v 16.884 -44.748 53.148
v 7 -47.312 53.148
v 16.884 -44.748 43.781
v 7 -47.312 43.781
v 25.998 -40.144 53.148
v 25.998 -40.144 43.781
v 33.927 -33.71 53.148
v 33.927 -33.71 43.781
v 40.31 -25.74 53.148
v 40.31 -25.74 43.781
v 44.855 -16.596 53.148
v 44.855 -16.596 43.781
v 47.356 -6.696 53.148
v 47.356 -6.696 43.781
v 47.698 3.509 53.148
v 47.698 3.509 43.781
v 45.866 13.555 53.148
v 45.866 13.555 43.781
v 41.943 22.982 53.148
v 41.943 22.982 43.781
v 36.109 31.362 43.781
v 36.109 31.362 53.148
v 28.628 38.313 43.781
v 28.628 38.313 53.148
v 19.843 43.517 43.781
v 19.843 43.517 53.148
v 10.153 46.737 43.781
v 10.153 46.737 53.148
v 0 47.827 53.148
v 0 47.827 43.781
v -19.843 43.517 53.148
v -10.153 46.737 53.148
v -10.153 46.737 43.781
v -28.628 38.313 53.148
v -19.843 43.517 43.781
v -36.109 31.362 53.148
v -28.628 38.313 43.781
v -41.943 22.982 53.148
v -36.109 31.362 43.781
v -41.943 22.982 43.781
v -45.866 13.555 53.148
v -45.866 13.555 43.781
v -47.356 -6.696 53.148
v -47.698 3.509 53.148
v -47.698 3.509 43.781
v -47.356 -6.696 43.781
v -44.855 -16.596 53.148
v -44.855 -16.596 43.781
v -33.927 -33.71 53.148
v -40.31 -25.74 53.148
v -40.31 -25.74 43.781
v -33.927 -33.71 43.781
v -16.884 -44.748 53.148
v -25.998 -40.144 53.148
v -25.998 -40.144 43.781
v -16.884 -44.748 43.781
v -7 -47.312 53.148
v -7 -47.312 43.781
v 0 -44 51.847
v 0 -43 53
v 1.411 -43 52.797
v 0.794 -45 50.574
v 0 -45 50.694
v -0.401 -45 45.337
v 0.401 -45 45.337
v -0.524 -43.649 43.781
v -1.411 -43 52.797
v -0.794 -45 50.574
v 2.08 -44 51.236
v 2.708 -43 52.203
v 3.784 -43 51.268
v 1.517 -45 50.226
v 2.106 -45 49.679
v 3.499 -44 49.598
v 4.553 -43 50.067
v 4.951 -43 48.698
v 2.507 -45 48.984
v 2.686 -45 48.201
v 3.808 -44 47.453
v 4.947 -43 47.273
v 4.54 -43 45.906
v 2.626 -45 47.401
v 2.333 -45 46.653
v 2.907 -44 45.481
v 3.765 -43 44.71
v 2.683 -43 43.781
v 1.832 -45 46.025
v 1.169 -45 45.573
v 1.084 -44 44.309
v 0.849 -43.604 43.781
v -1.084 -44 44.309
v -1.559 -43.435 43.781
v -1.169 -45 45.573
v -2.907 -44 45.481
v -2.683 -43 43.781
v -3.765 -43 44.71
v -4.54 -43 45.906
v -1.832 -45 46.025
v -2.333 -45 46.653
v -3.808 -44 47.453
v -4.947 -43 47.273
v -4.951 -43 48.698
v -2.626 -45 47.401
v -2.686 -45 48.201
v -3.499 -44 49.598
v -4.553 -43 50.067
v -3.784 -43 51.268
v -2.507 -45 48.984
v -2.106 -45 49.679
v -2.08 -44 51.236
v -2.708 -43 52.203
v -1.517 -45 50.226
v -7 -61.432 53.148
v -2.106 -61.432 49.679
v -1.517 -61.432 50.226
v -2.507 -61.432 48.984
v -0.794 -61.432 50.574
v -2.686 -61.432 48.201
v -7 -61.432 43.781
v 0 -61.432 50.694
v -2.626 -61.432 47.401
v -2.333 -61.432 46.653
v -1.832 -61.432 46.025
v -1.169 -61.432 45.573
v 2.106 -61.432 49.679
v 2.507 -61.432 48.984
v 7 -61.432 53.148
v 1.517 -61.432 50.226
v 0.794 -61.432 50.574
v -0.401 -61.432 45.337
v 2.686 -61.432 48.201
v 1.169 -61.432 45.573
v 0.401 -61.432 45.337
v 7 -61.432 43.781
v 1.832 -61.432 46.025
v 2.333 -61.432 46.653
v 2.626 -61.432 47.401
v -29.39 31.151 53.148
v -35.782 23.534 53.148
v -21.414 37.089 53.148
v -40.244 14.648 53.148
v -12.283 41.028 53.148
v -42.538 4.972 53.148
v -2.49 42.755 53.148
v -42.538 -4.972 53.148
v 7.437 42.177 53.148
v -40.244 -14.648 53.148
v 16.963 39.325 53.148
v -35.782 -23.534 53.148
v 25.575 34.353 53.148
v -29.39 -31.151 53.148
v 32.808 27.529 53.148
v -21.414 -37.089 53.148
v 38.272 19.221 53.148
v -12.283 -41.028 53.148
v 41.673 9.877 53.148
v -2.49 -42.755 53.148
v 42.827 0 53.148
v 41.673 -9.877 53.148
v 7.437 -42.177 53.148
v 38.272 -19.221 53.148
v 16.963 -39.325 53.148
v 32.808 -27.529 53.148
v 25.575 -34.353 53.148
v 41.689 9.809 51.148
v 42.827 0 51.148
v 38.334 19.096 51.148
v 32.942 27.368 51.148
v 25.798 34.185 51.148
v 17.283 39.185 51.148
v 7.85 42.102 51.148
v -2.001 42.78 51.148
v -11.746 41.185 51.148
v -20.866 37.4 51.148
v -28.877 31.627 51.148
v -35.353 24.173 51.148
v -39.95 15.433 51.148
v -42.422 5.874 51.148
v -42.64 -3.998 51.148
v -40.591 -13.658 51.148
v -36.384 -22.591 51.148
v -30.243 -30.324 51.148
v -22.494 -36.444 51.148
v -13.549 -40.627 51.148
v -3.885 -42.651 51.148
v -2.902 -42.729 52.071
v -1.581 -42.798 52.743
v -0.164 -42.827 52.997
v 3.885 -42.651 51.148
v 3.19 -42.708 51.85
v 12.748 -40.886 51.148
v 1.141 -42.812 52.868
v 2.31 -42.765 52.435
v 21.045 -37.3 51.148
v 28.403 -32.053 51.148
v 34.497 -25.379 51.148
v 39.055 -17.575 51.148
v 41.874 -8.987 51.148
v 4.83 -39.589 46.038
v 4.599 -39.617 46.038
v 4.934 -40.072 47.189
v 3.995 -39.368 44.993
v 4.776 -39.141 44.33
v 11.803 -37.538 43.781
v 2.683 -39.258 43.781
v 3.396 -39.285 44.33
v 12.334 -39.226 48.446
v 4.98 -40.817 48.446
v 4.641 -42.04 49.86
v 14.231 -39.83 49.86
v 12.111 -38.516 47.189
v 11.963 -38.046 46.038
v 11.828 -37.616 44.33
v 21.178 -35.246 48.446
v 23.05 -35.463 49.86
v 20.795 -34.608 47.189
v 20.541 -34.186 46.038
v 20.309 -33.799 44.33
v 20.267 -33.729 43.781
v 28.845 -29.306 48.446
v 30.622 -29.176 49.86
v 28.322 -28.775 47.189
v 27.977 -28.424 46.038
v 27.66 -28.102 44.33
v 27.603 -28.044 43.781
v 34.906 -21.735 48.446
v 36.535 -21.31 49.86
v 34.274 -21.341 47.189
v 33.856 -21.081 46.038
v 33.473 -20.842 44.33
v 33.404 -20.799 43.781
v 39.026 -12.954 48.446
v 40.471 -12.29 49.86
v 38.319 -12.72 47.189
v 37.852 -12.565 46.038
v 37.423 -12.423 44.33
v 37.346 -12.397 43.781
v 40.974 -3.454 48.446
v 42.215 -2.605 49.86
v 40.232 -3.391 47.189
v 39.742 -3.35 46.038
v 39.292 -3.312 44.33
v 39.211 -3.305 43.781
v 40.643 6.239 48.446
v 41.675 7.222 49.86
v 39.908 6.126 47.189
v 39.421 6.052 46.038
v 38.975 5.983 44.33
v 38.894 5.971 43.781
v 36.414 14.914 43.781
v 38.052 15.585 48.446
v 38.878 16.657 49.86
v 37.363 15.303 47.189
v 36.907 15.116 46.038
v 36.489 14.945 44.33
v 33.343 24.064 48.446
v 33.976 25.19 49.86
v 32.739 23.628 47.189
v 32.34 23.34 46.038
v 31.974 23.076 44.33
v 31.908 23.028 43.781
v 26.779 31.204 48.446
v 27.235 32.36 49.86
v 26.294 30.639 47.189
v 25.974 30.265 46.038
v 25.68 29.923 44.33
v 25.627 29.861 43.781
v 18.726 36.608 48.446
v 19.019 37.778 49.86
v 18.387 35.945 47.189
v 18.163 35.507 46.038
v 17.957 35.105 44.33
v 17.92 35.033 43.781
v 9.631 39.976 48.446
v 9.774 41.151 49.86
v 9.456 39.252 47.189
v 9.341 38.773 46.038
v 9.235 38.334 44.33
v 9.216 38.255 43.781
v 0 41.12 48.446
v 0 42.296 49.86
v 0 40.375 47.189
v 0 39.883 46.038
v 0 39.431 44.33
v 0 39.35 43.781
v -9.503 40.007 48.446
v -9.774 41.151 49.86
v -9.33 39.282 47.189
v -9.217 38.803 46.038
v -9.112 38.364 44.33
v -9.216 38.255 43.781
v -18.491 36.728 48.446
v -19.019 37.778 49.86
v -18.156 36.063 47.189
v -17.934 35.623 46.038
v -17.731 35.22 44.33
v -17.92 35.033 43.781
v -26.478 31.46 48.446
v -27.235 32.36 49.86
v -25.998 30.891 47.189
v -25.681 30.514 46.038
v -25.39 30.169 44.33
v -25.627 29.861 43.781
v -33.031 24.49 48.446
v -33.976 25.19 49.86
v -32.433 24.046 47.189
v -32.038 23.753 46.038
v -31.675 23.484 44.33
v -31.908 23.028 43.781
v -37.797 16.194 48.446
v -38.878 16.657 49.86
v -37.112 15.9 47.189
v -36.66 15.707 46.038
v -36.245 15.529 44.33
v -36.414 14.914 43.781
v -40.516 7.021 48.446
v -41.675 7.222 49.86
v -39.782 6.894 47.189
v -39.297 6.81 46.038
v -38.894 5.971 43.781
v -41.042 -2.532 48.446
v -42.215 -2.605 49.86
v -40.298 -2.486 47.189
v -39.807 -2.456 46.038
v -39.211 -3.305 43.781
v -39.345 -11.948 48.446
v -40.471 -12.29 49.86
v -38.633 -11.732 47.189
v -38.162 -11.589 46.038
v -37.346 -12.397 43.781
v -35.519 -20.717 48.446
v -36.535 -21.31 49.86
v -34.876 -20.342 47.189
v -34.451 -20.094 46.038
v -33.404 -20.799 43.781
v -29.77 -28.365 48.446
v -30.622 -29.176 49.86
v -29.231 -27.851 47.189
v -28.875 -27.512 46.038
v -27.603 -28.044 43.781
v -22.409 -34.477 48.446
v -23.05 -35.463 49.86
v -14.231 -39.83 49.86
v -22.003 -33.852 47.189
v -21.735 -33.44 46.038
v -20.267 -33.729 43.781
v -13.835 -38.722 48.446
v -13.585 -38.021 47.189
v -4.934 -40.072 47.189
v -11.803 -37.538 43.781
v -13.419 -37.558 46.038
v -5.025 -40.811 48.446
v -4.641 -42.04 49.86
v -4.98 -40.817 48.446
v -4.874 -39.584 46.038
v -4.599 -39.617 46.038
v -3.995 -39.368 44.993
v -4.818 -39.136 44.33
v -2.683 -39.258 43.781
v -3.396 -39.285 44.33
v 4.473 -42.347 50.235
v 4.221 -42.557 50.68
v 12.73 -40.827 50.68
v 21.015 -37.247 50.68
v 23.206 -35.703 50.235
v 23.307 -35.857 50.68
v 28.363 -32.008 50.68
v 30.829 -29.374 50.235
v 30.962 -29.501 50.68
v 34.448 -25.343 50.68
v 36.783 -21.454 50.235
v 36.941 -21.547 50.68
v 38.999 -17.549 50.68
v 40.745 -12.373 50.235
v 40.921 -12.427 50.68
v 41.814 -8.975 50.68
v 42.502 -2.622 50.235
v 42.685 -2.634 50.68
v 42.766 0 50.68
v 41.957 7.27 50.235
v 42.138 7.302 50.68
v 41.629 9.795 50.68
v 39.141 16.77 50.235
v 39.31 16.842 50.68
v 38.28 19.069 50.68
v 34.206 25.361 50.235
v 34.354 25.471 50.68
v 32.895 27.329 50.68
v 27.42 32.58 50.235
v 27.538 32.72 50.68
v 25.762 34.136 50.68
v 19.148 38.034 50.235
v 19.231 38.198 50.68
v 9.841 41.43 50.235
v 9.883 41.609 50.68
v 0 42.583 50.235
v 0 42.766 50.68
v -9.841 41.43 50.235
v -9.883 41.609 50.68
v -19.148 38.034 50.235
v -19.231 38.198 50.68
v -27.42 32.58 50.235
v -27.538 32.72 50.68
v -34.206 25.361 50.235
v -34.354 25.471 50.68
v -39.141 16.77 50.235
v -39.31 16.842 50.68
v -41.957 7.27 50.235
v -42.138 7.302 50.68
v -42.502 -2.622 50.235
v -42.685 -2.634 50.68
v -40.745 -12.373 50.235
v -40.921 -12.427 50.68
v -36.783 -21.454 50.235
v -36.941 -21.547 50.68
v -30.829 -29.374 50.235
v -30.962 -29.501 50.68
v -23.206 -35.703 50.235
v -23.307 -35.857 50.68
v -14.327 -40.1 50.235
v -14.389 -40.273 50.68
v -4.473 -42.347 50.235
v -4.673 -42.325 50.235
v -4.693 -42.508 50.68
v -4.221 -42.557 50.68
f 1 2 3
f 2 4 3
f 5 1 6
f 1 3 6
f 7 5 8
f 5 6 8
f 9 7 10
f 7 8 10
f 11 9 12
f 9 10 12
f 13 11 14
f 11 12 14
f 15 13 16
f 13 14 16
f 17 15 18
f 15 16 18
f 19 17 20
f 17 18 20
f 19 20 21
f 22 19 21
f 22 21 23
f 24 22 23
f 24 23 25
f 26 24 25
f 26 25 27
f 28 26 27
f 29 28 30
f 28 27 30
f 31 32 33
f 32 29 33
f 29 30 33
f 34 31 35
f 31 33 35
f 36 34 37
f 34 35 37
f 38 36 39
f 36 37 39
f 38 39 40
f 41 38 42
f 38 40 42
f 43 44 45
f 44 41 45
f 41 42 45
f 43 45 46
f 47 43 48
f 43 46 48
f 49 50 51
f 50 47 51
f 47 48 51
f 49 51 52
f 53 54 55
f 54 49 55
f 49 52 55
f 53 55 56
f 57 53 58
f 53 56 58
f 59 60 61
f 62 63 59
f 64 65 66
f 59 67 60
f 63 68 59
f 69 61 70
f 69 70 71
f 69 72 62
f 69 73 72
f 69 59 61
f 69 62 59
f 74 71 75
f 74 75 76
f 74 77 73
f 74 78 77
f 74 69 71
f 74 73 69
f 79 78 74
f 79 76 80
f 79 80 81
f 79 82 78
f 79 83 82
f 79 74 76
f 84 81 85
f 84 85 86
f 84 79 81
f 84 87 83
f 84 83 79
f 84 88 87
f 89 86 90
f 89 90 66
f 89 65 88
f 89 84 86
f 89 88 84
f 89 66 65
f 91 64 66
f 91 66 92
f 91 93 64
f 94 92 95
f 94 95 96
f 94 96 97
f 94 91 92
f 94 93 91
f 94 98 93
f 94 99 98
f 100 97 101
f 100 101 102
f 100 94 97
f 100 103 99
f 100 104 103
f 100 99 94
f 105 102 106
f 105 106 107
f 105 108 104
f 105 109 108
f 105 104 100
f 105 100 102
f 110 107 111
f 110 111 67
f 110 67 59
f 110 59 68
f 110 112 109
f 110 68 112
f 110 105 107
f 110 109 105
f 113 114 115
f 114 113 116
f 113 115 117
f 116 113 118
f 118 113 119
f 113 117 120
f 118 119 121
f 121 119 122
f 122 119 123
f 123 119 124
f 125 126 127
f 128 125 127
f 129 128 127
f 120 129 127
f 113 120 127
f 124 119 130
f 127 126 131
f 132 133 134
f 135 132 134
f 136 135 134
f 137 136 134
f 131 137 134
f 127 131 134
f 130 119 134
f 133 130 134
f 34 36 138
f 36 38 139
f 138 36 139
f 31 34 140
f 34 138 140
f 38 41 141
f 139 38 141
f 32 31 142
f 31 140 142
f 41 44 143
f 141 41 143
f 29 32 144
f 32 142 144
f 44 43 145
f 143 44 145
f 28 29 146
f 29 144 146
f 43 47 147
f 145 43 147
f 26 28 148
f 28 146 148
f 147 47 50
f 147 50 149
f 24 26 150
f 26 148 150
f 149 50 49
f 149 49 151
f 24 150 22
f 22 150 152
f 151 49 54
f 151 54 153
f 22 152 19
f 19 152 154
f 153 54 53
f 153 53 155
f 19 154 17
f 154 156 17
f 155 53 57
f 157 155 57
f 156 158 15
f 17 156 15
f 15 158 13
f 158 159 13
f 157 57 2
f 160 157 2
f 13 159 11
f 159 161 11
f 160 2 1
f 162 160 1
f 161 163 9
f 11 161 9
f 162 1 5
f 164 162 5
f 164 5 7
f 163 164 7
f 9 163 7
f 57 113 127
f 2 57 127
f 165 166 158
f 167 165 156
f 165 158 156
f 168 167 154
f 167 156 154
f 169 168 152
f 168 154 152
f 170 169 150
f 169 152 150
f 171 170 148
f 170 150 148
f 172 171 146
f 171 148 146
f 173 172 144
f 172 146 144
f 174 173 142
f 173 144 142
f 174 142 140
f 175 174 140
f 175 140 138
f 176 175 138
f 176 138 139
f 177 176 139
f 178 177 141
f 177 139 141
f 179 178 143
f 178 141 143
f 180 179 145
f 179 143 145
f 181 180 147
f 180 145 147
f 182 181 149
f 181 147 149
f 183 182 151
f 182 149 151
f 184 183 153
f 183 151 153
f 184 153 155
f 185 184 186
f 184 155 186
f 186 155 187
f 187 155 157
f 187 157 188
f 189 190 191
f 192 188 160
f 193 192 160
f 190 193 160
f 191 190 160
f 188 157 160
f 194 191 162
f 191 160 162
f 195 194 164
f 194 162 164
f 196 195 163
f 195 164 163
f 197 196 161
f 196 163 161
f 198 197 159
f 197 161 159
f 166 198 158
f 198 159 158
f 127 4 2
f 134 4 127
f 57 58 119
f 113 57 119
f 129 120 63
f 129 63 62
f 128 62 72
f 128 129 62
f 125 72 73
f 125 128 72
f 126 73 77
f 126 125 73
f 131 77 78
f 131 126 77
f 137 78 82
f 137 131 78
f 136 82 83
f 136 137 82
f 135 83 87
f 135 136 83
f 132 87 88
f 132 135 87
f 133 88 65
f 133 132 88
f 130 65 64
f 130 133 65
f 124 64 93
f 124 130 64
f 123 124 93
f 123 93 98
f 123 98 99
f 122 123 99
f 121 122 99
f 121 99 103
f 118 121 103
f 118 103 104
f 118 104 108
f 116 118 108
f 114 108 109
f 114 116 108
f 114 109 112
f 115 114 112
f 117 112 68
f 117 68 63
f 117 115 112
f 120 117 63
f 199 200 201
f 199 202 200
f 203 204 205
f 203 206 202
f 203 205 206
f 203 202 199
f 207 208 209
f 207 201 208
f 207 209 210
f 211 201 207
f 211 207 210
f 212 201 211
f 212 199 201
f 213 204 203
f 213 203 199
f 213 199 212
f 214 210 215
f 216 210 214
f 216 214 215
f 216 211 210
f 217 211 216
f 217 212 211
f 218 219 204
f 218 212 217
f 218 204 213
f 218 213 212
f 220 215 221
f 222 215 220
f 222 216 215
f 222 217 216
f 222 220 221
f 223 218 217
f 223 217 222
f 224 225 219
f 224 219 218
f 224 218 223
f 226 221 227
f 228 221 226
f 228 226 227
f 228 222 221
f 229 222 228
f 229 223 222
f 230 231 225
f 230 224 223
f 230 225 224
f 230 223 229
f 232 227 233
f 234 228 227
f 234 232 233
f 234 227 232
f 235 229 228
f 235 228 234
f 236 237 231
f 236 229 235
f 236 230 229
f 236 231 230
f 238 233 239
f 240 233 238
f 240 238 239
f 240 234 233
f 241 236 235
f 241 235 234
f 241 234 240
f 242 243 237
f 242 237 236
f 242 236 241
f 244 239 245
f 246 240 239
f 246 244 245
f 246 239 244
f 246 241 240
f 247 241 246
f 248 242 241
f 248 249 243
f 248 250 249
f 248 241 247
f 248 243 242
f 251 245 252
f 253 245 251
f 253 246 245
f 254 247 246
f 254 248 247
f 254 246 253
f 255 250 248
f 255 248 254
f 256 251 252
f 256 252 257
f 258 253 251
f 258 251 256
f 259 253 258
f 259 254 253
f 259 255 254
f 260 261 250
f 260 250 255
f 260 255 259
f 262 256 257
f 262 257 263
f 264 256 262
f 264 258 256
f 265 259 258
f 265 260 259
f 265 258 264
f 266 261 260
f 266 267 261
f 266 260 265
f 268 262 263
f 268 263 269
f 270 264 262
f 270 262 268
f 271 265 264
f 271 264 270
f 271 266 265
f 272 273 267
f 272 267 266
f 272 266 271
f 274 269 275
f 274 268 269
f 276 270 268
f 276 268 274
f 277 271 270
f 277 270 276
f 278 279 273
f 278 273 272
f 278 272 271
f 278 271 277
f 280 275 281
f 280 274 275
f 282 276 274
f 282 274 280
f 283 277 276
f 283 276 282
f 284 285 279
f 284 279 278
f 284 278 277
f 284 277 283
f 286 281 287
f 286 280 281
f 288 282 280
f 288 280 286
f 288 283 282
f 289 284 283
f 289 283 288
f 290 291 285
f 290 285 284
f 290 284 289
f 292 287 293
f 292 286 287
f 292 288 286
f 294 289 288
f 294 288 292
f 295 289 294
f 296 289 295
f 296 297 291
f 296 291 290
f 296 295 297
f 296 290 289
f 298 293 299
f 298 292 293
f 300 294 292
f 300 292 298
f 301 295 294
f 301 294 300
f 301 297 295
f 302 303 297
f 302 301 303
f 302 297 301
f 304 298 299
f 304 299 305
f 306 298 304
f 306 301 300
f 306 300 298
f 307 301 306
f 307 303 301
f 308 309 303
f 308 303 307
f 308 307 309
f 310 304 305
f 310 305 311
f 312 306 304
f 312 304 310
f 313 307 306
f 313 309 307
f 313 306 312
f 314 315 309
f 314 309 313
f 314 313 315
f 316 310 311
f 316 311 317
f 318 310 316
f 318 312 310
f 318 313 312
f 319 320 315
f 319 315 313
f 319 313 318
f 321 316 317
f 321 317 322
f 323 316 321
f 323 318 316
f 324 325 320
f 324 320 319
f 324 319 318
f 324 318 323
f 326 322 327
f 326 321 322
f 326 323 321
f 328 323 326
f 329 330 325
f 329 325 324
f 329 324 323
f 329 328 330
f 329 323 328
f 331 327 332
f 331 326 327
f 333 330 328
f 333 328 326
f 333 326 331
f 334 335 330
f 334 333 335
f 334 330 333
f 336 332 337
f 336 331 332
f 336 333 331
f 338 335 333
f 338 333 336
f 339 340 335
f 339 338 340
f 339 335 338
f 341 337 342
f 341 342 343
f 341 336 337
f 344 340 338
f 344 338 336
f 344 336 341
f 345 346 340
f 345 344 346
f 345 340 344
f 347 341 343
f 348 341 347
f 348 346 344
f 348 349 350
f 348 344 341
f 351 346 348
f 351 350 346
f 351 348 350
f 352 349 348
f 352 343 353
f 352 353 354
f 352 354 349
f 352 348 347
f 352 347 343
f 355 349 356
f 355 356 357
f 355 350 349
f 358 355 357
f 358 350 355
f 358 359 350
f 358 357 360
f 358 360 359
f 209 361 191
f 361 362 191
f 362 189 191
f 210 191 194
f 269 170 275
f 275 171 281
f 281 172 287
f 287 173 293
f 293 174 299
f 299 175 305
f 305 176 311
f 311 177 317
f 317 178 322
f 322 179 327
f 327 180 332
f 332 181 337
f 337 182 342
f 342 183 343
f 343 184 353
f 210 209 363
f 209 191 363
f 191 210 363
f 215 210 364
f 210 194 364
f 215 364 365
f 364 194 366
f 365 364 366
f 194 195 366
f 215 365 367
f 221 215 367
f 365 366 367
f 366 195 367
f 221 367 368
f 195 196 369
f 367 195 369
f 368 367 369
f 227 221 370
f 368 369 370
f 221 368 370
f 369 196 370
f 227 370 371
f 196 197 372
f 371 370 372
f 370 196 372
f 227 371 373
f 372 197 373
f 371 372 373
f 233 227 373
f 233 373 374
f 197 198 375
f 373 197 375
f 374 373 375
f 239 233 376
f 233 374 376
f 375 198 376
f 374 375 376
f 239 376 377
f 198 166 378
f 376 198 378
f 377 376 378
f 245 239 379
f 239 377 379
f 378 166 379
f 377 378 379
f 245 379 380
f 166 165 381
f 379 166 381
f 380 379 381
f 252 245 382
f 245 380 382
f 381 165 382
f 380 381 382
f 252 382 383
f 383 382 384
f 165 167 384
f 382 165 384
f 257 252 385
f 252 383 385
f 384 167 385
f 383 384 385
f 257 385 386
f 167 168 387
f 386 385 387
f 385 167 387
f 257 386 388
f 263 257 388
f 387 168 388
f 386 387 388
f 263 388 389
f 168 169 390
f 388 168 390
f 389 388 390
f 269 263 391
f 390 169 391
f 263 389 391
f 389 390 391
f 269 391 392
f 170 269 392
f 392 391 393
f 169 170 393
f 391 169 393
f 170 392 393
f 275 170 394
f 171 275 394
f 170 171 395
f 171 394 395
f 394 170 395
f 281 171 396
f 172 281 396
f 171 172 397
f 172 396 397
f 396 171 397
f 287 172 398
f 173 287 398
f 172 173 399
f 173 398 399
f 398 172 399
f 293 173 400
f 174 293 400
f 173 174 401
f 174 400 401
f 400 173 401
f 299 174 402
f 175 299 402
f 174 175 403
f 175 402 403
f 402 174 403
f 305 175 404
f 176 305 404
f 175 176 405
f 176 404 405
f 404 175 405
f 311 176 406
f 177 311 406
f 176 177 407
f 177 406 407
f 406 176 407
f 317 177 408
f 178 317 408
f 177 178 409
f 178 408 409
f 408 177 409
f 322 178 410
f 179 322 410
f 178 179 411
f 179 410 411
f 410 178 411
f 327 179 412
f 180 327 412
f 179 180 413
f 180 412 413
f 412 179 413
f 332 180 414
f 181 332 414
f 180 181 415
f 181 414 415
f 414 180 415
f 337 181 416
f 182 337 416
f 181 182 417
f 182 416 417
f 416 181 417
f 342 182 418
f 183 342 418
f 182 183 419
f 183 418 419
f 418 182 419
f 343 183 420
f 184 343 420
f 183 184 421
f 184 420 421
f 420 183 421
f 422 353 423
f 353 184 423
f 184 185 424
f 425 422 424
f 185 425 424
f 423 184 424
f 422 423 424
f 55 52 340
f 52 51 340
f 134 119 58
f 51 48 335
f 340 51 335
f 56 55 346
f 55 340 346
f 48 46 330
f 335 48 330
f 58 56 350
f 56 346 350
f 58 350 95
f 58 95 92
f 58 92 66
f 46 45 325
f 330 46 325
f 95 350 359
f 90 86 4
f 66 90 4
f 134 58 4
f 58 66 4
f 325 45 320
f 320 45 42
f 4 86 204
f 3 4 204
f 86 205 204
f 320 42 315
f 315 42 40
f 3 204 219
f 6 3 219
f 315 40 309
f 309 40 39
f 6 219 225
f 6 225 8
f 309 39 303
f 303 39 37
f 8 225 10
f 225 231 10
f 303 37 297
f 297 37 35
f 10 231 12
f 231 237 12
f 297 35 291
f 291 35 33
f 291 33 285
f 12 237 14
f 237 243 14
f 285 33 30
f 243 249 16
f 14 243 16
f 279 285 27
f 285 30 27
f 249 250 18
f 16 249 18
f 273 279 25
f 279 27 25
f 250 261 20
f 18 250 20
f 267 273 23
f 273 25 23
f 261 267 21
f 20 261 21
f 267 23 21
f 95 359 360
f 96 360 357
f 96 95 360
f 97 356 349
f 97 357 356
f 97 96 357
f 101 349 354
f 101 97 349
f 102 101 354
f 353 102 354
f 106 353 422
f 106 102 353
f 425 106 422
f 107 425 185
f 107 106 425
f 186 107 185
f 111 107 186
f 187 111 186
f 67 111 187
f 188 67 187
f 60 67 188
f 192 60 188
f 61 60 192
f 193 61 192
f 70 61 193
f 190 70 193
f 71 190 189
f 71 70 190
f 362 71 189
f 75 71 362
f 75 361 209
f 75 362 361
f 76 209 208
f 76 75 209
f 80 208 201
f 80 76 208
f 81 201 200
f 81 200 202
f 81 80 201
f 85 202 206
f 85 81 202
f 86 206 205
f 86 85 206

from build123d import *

# Parameters (mm, degrees)
SKETCH002_W = 7
SKETCH002_H = 14.789333
PAD_DEPTH   = 9.367216


with BuildPart() as part:
    # Sketch → Revolution (revolve)
    with BuildSketch(Plane.XZ):
        with BuildLine():
            ThreePointArc((42.295694, 49.859657), (40.314757, 47.066424), (39.35, 43.780773))
            Line((47.827152, 43.780773), (39.35, 43.780773))
            Line((47.827152, 53.147989), (47.827152, 43.780773))
            Line((42.827152, 53.147989), (47.827152, 53.147989))
            Line((42.827152, 51.147989), (42.827152, 53.147989))
            ThreePointArc((42.295694, 49.859657), (42.68907, 50.451166), (42.827152, 51.147989))
        make_face()
    revolve(axis=Axis((0, 0, 0), (0, 0, 1)))

    # Sketch002 (on DatumPlane) → Pad (new body)
    with BuildSketch(Plane(origin=(0, 0, 43.780773), x_dir=(-1, 0, 0), z_dir=(0, 0, 1))):
        with Locations((-3.5, 54.037153)):
            Rectangle(SKETCH002_W, SKETCH002_H)
    pad = extrude(amount=PAD_DEPTH)

    # Mirrored: Pad across Sketch002 V_Axis
    add(pad.mirror(Plane(origin=(0, 0, 43.780773), x_dir=(0, 0, 1), z_dir=(-1, 0, 0))))

    # Sketch003 → Groove (revolve, cut)
    with BuildSketch(Plane(origin=(0, -43, 48), x_dir=(0, 1, 0), z_dir=(1, 0, 0))):
        Polygon((0, 5), (-2, 2.693579), (-42.222773, 2.693579), (-42.408872, 0), (36.192486, 0), (36.192486, 5), align=None)
    revolve(axis=Axis((0, -43, 48), (0, 1, 0)), mode=Mode.SUBTRACT)


solid = part.part
